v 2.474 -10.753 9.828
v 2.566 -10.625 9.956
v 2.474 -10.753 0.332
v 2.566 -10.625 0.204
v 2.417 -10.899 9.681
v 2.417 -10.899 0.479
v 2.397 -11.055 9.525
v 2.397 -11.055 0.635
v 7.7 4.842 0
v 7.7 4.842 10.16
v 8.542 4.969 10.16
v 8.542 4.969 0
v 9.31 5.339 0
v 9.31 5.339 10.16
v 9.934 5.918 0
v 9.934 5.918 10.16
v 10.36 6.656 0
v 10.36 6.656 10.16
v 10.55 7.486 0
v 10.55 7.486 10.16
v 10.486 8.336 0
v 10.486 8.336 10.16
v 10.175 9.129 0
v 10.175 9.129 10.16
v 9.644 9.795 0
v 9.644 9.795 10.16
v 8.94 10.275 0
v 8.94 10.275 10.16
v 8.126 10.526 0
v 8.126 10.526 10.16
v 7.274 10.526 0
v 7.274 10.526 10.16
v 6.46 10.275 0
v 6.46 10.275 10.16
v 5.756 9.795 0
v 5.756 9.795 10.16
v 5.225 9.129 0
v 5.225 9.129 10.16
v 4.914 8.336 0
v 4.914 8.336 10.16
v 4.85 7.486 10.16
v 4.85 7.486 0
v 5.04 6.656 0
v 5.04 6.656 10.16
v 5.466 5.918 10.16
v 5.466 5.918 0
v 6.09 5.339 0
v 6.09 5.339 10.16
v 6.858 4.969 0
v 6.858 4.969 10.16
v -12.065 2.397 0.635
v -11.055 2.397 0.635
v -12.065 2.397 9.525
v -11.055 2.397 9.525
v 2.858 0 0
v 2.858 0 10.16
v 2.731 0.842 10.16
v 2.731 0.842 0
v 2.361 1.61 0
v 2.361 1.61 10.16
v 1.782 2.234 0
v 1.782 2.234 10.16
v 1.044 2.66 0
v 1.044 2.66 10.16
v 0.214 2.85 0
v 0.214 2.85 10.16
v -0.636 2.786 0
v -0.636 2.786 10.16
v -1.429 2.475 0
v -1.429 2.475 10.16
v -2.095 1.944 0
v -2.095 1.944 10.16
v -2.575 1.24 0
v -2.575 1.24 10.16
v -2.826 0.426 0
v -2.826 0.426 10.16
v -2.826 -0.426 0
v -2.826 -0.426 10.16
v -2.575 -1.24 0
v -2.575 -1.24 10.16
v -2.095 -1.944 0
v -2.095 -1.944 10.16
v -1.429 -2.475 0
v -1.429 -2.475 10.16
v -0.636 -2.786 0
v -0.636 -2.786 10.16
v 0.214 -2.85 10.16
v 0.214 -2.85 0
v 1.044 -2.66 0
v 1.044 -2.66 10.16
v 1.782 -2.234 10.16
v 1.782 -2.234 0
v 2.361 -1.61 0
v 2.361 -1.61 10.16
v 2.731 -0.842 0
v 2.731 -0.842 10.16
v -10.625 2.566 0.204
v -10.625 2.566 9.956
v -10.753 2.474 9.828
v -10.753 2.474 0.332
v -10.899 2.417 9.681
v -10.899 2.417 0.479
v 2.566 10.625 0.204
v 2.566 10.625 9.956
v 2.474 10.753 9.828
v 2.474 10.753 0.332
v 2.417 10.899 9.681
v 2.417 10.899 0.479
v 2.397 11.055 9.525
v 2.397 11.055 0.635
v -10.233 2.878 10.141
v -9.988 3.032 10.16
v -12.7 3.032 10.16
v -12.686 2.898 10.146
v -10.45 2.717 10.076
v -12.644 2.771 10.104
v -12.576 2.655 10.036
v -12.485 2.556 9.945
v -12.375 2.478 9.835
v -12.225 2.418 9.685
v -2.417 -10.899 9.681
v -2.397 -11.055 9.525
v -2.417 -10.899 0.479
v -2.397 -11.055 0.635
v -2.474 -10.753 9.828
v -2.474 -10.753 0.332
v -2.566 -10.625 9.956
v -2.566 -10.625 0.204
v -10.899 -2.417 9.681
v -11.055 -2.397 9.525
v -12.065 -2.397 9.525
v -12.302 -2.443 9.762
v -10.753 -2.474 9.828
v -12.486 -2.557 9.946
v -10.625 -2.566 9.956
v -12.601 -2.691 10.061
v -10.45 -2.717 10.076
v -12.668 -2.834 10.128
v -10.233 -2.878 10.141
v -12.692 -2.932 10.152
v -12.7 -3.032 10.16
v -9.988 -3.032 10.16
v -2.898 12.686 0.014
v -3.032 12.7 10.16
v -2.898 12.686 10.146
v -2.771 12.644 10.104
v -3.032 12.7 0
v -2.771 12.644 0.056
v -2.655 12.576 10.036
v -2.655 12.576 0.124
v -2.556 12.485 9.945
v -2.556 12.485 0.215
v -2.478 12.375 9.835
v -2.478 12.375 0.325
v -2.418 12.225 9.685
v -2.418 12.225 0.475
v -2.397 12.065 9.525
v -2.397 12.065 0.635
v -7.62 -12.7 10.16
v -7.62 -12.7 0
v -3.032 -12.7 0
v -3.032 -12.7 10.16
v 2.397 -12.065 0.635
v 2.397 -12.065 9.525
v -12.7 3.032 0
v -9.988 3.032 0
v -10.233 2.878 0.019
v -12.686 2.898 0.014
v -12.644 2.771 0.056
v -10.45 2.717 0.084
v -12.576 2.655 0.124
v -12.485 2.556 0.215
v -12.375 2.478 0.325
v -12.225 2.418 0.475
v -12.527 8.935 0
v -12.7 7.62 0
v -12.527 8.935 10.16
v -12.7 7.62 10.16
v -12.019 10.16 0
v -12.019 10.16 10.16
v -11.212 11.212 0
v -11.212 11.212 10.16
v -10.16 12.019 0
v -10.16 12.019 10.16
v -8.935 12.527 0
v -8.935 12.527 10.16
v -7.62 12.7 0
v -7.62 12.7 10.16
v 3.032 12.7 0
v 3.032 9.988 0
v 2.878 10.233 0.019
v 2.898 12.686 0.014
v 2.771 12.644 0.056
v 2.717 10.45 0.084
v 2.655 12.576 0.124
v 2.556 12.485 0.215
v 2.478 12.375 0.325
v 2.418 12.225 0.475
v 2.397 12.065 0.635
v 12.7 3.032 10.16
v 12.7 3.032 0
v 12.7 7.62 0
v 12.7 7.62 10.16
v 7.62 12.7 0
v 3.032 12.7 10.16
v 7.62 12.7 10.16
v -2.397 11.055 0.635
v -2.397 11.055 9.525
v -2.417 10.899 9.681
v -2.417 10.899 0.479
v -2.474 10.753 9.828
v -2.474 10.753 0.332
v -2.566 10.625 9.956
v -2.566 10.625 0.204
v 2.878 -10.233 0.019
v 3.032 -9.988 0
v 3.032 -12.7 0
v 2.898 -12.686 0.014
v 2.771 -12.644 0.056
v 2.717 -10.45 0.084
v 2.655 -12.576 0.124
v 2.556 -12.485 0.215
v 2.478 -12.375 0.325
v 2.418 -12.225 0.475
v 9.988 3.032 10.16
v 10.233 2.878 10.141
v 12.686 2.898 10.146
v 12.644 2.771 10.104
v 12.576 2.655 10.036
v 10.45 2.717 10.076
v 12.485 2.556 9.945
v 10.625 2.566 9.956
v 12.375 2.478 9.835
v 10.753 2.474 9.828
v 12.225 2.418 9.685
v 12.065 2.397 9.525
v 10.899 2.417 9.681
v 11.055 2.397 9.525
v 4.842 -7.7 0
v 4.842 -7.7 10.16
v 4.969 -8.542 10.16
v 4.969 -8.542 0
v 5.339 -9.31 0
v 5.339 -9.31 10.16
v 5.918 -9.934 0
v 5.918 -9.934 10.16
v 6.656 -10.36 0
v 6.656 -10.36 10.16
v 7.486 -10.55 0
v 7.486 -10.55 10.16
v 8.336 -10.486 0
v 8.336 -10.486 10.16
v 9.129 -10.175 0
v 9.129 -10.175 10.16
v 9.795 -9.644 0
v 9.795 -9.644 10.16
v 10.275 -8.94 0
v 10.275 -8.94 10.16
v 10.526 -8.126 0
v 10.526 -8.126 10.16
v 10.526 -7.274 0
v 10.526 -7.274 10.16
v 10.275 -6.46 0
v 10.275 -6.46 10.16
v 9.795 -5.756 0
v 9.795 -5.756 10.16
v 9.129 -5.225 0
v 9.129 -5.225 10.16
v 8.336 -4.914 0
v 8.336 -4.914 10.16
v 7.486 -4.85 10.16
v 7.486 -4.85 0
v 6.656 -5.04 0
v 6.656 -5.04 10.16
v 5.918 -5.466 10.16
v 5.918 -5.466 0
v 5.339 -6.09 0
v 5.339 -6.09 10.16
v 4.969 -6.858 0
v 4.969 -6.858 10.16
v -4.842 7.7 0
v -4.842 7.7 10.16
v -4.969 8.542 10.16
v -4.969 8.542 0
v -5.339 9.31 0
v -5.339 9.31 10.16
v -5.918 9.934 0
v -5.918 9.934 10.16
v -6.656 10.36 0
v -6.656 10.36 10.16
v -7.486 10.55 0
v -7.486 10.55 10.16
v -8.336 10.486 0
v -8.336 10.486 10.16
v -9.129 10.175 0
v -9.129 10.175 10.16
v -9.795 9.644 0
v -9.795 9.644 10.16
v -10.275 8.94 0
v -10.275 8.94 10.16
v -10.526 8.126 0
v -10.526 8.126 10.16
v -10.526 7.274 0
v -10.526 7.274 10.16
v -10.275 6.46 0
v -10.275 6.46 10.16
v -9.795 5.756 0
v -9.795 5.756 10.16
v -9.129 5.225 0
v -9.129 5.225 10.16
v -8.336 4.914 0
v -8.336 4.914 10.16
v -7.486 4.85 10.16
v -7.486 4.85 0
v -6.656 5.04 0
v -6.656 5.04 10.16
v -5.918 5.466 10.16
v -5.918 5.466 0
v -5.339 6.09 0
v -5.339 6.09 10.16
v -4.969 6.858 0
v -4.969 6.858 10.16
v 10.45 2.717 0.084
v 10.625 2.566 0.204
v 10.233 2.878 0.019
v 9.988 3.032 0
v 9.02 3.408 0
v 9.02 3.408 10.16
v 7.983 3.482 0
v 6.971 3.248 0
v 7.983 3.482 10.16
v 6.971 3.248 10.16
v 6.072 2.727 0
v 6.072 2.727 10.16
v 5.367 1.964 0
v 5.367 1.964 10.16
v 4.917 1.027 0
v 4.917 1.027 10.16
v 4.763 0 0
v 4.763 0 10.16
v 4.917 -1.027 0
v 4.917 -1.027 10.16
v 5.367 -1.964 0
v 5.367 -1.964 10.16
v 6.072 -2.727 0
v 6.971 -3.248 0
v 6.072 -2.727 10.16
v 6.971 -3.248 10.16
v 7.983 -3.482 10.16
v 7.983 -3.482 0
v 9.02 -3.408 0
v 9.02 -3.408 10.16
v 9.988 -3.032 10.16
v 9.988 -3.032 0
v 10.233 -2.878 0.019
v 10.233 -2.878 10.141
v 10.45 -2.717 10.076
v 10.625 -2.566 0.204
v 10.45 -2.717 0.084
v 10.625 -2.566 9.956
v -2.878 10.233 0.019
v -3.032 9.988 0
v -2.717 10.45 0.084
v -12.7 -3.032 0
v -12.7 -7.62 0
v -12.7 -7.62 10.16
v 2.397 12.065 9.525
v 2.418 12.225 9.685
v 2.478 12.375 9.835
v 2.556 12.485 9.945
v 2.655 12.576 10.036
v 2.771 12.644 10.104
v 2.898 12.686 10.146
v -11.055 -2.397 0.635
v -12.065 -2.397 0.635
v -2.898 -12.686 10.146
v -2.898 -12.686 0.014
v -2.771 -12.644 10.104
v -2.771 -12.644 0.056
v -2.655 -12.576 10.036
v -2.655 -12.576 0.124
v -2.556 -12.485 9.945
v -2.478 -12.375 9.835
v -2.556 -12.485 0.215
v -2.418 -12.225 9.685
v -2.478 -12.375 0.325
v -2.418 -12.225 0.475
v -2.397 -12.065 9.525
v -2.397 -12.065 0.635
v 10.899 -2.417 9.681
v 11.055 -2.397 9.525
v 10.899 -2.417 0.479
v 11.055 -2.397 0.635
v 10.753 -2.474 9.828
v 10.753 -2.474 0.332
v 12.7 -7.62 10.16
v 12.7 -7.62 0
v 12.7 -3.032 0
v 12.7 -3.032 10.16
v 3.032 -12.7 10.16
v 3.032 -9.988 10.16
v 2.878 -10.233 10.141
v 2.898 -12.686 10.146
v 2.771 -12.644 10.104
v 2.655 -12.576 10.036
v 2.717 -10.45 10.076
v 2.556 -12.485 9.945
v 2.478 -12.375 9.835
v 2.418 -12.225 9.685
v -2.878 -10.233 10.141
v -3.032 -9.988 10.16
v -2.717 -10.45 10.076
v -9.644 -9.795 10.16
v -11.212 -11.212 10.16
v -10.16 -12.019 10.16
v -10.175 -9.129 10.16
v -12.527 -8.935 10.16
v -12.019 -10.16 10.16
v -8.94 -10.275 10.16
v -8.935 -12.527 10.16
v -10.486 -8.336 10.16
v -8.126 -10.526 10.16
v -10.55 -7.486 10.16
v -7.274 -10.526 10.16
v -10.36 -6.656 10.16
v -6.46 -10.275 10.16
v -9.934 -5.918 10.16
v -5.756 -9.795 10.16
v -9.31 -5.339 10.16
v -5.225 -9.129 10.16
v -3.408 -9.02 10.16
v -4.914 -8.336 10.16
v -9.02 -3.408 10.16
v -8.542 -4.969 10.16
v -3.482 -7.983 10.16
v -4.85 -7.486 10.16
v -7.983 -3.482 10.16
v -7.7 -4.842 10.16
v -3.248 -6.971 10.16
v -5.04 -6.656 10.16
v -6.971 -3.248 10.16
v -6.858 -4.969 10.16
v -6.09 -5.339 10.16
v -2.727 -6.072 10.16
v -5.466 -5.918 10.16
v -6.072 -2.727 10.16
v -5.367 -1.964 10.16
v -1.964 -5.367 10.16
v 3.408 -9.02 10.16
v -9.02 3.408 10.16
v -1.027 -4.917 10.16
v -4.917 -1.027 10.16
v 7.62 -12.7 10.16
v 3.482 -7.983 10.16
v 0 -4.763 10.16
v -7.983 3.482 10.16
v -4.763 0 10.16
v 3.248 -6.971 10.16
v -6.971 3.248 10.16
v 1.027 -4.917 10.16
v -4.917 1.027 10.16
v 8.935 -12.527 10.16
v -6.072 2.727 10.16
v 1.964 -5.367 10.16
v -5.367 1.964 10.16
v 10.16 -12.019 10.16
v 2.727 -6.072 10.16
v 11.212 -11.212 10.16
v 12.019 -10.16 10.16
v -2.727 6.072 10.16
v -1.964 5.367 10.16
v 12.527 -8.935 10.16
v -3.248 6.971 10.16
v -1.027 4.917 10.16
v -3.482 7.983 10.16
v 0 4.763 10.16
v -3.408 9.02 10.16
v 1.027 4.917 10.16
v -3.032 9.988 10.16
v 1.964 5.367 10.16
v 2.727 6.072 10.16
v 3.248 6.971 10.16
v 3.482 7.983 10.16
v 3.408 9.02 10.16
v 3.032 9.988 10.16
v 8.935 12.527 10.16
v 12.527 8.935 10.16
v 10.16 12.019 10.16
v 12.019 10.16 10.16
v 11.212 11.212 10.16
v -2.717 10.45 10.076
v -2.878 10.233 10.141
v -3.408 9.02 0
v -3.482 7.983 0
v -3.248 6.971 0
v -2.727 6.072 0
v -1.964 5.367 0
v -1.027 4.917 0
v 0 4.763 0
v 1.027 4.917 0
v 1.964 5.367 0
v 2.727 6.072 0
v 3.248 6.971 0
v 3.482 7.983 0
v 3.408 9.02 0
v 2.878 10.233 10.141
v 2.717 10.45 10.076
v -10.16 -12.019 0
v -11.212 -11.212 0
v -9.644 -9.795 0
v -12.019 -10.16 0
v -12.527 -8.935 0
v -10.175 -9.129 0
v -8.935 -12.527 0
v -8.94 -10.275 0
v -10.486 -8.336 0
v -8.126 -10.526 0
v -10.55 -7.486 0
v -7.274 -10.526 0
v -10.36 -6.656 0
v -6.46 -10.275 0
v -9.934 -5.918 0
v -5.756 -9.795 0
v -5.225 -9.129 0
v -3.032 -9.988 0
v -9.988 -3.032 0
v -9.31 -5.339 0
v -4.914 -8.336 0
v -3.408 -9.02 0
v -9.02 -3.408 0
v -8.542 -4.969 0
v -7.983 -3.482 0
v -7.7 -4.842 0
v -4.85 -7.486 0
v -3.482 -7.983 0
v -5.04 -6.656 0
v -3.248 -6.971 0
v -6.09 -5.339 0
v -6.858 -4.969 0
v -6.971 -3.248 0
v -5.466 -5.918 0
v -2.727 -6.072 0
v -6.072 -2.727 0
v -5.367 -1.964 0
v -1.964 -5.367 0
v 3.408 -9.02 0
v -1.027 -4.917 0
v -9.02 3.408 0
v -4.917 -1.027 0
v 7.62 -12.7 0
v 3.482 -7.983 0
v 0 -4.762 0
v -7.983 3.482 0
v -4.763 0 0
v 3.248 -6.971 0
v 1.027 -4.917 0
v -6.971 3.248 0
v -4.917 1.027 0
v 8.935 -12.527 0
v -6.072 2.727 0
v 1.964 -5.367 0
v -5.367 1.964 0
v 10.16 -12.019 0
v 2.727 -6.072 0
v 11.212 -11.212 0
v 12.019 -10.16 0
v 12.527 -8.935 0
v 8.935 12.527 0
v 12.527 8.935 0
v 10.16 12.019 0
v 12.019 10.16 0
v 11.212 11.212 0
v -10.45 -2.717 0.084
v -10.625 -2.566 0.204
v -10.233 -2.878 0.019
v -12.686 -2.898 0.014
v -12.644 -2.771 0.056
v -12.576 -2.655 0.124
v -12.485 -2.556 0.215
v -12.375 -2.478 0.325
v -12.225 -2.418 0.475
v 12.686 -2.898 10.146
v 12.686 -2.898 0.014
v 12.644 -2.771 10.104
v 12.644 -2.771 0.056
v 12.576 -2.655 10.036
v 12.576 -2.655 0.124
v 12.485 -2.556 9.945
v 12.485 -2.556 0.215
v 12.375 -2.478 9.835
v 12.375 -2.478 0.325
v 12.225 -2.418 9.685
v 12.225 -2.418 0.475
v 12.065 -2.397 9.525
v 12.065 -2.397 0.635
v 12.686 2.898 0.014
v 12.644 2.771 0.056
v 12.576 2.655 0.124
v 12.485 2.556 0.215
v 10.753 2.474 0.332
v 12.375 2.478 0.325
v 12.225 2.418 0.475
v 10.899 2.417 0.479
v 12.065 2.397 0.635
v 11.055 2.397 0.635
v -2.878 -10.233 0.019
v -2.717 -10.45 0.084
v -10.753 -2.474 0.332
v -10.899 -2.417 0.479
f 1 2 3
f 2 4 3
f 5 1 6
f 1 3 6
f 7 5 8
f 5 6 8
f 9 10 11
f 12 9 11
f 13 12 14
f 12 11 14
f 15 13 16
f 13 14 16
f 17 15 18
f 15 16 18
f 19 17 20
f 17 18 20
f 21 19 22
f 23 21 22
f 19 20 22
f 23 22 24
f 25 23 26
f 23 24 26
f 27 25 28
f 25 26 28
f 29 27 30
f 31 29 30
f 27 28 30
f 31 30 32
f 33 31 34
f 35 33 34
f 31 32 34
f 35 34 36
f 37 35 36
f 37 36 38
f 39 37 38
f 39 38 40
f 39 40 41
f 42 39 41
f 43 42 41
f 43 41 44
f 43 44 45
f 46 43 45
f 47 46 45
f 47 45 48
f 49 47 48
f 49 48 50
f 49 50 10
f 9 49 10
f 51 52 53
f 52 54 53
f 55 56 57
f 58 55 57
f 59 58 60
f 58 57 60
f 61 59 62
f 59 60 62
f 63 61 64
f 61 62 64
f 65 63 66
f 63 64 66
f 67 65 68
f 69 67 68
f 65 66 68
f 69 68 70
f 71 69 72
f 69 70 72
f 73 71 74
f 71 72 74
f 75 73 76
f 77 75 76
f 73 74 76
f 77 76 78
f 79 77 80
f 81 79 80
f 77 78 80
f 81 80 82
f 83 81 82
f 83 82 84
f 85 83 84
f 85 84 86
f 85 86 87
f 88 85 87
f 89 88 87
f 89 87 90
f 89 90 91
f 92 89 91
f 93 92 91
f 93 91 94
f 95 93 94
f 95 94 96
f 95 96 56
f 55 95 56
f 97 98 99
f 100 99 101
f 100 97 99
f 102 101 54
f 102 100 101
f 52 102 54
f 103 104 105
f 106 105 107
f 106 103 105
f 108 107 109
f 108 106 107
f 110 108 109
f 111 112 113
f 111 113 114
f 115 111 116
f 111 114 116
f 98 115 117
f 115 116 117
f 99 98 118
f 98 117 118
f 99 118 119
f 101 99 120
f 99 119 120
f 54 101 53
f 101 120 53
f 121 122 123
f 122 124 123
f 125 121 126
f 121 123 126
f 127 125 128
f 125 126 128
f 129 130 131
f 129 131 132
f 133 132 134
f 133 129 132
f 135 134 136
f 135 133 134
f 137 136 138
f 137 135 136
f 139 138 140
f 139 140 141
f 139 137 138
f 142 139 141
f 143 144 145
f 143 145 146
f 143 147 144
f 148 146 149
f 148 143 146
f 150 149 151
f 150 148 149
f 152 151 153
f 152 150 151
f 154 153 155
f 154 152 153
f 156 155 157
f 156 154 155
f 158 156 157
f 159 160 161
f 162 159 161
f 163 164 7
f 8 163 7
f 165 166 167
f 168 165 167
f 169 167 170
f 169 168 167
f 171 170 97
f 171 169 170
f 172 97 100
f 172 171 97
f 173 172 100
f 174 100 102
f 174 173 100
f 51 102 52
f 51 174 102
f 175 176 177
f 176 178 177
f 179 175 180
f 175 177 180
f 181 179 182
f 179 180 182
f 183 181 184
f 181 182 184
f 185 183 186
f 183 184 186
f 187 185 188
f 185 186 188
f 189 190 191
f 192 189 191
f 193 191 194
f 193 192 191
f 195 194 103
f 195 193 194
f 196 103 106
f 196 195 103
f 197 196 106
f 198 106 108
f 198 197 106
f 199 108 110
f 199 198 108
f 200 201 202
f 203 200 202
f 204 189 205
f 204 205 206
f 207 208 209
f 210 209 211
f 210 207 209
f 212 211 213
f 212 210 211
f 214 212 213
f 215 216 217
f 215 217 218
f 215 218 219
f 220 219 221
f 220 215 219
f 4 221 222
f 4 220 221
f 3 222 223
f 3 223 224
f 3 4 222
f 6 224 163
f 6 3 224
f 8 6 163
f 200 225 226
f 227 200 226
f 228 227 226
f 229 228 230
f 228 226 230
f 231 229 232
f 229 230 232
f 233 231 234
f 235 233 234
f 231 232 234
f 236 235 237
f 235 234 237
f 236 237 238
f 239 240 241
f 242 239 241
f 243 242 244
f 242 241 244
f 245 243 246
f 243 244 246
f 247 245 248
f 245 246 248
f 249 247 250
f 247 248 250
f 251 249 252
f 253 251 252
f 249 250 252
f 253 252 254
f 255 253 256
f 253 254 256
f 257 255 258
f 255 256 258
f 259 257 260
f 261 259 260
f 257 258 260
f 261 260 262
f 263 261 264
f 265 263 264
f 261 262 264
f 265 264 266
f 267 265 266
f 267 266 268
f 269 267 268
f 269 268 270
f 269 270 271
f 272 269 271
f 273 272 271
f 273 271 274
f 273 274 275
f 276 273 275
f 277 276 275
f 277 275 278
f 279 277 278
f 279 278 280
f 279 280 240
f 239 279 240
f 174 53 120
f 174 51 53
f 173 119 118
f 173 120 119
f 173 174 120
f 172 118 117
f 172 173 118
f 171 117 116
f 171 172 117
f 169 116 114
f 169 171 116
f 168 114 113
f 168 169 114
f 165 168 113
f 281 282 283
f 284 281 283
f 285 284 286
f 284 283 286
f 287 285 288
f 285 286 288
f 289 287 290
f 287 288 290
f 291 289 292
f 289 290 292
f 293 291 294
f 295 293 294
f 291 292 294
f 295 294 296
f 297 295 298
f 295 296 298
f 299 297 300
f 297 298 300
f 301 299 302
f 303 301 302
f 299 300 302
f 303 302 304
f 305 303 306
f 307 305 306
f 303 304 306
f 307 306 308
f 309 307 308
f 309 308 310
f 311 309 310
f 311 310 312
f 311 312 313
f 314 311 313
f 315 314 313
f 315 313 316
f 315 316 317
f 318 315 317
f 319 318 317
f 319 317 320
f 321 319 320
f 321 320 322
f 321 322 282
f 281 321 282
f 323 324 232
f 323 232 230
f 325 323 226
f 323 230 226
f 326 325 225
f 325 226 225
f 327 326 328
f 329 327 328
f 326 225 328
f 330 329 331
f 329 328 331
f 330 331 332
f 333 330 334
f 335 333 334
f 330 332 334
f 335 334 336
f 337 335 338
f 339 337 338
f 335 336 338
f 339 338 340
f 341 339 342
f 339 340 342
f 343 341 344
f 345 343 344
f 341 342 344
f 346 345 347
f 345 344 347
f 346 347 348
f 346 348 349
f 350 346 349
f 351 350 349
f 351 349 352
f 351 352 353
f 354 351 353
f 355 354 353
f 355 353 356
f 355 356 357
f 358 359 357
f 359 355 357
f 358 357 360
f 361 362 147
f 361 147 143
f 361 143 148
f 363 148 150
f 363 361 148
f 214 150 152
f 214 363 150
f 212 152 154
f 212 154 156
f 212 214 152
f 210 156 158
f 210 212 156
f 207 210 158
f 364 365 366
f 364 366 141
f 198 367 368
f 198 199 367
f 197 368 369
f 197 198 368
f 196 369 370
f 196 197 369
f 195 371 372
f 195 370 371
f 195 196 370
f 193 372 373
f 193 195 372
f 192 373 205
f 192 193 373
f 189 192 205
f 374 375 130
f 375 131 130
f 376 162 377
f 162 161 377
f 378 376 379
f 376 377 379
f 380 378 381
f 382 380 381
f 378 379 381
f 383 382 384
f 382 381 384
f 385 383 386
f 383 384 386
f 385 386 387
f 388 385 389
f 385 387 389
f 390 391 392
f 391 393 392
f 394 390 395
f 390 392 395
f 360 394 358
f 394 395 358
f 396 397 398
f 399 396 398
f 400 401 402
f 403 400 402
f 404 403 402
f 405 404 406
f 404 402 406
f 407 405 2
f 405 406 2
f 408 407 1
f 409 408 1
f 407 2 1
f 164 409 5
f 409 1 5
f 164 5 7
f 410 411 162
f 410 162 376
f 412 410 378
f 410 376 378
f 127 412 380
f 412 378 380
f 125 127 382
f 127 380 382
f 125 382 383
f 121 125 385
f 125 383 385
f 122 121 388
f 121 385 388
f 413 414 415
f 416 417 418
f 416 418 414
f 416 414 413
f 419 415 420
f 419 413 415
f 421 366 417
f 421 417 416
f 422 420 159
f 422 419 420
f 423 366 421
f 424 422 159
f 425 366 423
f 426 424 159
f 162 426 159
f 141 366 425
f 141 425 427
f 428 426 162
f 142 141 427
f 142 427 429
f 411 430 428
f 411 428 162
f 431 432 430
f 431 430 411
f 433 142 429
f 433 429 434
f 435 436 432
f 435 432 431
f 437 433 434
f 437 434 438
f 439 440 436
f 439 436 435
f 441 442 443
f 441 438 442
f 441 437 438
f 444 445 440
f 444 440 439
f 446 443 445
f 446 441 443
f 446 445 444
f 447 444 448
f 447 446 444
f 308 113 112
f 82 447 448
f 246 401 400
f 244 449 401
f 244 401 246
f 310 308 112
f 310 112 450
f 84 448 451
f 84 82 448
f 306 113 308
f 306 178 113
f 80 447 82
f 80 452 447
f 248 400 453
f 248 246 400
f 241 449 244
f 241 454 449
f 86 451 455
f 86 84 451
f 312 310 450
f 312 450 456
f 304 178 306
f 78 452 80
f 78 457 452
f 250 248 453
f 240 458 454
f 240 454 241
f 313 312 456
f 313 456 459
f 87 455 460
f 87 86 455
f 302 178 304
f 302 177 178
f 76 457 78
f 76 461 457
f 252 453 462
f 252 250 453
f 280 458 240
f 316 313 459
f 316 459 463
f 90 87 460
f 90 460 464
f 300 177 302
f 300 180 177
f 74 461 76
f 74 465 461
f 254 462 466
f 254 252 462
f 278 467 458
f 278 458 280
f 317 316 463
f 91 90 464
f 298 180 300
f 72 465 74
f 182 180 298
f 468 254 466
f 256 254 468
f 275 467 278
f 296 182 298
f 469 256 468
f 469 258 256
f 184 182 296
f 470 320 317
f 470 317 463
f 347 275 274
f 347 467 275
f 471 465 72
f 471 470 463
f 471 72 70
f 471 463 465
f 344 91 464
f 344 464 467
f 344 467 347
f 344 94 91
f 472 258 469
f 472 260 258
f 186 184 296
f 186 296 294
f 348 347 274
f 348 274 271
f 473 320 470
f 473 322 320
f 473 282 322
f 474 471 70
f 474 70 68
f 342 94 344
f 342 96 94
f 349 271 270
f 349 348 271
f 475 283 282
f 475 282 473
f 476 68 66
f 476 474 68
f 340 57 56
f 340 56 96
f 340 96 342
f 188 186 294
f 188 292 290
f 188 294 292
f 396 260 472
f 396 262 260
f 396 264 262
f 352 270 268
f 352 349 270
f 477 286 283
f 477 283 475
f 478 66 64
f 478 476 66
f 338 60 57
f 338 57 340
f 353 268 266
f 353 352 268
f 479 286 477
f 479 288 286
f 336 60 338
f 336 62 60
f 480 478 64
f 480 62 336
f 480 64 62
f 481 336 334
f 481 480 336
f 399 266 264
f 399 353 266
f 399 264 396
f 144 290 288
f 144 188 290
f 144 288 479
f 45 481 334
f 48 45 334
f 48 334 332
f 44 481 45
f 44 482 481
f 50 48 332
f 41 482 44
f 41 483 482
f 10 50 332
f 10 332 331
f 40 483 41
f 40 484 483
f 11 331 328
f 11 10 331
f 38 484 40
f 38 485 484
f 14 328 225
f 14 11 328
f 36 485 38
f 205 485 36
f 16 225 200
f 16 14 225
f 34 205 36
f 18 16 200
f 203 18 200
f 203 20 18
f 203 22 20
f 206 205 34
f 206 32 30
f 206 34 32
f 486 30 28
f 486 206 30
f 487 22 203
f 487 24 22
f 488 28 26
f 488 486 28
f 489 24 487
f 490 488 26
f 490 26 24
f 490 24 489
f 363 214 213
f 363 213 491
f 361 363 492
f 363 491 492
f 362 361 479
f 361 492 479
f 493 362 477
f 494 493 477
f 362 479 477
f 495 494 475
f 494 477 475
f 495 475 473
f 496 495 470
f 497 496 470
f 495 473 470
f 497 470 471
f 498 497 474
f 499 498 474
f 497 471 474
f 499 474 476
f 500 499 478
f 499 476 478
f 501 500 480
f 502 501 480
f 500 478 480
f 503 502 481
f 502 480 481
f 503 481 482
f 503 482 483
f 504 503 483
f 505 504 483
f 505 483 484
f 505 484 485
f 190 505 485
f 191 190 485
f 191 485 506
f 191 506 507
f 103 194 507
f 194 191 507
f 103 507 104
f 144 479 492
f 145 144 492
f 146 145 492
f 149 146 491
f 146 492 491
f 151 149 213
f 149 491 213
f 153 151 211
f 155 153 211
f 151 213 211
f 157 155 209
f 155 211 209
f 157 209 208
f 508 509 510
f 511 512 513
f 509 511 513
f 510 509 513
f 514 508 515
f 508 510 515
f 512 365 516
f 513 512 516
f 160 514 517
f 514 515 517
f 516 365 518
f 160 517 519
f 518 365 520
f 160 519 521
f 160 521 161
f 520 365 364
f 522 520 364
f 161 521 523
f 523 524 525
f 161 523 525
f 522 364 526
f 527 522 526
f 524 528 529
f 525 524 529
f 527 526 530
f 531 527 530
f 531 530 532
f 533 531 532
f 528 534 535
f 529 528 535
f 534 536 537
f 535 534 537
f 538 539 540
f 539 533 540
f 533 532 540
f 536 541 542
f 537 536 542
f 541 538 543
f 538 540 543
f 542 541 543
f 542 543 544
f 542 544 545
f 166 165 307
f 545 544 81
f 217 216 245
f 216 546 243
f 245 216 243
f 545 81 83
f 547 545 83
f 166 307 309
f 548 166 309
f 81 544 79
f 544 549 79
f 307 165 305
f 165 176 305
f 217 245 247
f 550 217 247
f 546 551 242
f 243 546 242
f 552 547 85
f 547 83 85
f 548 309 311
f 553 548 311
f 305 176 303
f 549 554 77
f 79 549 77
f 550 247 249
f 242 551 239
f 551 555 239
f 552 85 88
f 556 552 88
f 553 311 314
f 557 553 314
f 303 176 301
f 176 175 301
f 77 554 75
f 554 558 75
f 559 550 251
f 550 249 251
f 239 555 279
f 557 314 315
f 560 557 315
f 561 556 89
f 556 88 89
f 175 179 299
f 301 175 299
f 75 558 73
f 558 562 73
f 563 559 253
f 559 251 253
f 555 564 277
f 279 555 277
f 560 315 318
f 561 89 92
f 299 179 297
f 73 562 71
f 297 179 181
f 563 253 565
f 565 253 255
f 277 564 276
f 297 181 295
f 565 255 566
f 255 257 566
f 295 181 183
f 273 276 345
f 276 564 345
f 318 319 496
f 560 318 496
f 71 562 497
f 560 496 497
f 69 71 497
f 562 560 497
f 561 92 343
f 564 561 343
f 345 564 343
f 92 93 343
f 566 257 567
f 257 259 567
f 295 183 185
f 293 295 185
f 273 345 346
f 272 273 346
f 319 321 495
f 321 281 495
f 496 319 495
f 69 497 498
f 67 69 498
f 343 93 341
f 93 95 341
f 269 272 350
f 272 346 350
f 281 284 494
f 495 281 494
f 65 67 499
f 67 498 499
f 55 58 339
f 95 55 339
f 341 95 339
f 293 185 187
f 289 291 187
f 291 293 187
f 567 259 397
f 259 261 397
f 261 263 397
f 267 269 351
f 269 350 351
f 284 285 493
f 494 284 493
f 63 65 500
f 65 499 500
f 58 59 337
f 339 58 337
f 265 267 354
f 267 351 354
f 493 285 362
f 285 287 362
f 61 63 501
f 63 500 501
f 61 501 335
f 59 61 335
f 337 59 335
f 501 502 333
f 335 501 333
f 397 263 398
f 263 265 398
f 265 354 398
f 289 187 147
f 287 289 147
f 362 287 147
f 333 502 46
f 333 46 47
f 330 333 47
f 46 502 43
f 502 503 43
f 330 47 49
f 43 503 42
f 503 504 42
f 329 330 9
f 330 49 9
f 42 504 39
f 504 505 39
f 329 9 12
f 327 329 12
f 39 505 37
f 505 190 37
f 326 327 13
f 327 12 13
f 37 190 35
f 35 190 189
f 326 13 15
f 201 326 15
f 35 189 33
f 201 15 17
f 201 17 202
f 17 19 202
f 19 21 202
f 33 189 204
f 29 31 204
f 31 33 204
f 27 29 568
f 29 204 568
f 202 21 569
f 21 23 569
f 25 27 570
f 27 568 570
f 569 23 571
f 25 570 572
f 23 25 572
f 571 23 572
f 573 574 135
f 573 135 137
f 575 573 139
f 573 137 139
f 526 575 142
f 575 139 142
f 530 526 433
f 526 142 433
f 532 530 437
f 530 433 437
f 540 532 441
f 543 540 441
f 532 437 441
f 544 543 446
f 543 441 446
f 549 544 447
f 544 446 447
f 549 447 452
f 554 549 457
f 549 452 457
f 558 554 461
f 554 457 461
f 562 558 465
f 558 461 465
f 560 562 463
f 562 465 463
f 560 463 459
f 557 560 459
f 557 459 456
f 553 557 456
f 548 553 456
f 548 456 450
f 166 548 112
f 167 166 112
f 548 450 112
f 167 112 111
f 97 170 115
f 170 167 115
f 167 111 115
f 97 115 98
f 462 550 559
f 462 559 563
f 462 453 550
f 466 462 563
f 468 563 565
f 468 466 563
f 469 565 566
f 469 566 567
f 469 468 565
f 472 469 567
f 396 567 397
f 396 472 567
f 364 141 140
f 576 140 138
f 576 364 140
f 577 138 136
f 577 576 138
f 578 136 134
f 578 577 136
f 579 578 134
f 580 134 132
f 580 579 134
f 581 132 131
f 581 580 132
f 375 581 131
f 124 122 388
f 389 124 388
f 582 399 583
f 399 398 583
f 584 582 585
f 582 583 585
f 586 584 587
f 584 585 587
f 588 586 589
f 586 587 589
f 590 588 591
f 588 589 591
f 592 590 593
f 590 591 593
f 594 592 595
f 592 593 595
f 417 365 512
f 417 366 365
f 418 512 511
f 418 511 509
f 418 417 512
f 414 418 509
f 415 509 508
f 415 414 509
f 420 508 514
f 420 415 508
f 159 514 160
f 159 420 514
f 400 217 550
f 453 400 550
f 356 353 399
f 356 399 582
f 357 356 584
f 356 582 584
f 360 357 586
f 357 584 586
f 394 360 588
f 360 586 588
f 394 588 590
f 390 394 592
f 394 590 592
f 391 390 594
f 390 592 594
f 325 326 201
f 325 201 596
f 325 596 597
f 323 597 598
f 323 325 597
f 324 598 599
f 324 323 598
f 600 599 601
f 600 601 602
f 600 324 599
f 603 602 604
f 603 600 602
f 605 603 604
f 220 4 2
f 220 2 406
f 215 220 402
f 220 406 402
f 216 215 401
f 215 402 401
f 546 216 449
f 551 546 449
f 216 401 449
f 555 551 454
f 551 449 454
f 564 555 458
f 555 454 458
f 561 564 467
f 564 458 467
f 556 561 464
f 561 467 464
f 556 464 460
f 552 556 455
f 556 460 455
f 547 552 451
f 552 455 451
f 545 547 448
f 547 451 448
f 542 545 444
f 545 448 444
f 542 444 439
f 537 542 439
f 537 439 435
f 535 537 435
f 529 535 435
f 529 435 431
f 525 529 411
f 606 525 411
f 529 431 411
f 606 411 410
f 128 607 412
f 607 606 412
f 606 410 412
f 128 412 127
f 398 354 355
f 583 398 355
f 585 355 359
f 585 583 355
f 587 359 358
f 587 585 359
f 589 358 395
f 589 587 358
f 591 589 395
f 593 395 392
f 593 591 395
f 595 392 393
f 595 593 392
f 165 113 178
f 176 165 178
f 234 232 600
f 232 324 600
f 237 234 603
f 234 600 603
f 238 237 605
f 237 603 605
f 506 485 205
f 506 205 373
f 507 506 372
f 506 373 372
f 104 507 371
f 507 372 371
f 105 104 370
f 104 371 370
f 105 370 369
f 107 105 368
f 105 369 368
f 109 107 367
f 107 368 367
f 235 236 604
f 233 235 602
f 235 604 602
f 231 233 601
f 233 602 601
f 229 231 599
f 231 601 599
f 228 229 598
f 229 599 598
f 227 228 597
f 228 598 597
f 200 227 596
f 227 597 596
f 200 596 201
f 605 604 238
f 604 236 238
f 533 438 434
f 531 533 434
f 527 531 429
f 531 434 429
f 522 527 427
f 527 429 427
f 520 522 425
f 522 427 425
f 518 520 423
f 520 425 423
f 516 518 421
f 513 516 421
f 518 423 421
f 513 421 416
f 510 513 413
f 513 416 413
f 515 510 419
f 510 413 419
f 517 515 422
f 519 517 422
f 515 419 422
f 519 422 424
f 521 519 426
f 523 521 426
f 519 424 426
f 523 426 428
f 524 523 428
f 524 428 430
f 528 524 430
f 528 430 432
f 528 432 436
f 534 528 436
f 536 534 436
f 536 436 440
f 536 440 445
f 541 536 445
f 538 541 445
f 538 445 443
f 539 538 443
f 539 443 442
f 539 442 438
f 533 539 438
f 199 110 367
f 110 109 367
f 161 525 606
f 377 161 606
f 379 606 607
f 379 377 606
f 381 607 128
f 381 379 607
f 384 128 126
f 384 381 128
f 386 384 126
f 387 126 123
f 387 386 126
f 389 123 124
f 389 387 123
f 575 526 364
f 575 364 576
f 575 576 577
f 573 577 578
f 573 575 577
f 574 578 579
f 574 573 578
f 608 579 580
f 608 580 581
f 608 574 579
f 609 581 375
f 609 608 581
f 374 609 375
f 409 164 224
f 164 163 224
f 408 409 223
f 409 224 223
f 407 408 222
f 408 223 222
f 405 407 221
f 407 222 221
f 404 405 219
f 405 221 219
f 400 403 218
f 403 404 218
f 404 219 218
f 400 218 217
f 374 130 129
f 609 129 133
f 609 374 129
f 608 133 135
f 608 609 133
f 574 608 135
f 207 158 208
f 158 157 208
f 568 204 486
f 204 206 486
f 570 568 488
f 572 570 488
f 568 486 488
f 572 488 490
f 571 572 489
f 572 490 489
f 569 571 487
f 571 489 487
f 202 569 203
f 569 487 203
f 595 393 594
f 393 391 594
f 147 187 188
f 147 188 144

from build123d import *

# Parameters (mm, degrees)
F0_W             = 25.4
F0_H             = 25.4
F1_DEPTH         = 10.16
F2_R             = 3.4925
F3_DEPTH         = 25.4
F3_COPIES_COUNT  = 4
F5_DEPTH         = 25.4
F5_COPIES_COUNT  = 4
F7_R             = 2.8575
F8_DEPTH         = 25.4
F9_R             = 2.8575
F10_DEPTH        = 25.4
F10_COPIES_COUNT = 4
F11_R            = 5.08
F12_R            = 0.635


# Not quite as in the source:
# - a pattern or mirror of a feature is missing from the dataset's text; its kind, count and spacing are read off the source's solid


with BuildPart() as f1:
    # F0 (on Top) → F1 (new body)
    with BuildSketch(Plane.XY):
        Rectangle(F0_W, F0_H)
    extrude(amount=F1_DEPTH)

    # F2 (on face) → F3 (cut)
    with BuildSketch(Plane.XY.offset(10.16)):
        with Locations((0, -8.255)):
            Circle(F2_R)
    f3 = extrude(amount=-F3_DEPTH, mode=Mode.SUBTRACT)

    # F3_copies: F3 ×4 about axis
    f3_copies_axis = Axis((0, 0, 0), (0, 0, 1))
    for i in range(1, F3_COPIES_COUNT):
        add(f3.rotate(f3_copies_axis, i * 360 / F3_COPIES_COUNT), mode=Mode.SUBTRACT)

    # F4 (on face) → F5 (cut)
    with BuildSketch(Plane.XY.offset(10.16)):
        with BuildLine():
            Line((-2.3970724332, -10.795), (-2.3970724332, -12.7))
            Line((-2.3970724332, -12.7), (2.3970724332, -12.7))
            Line((2.3970724332, -12.7), (2.3970724332, -10.795))
            ThreePointArc((2.3970724332, -10.795), (0, -11.7475), (-2.3970724332, -10.795))
        make_face()
    f5 = extrude(amount=-F5_DEPTH, mode=Mode.SUBTRACT)

    # F5_copies: F5 ×4 about axis
    f5_copies_axis = Axis((0, 0, 0), (0, 0, 1))
    for i in range(1, F5_COPIES_COUNT):
        add(f5.rotate(f5_copies_axis, i * 360 / F5_COPIES_COUNT), mode=Mode.SUBTRACT)

    # F7 (on face) → F8 (cut)
    with BuildSketch(Plane.XY.offset(10.16)):
        Circle(F7_R)
    extrude(amount=-F8_DEPTH, mode=Mode.SUBTRACT)

    # F9 (on face) → F10 (cut)
    with BuildSketch(Plane.XY.offset(10.16)):
        with Locations((-7.7, 7.7)):
            Circle(F9_R)
    f10 = extrude(amount=-F10_DEPTH, mode=Mode.SUBTRACT)

    # F10_copies: F10 ×4 about axis
    f10_copies_axis = Axis((0, 0, 0), (0, 0, 1))
    for i in range(1, F10_COPIES_COUNT):
        add(f10.rotate(f10_copies_axis, i * 360 / F10_COPIES_COUNT), mode=Mode.SUBTRACT)

    # F11
    f11_edges = [f1.edges().sort_by_distance(p)[0] for p in [
        (-12.7, 12.7, 5.08),
        (-12.7, -12.7, 5.08),
        (12.7, -12.7, 5.08),
        (12.7, 12.7, 5.08),
    ]]
    fillet(f11_edges, radius=F11_R)

    # F12
    f12_edges = [f1.edges().sort_by_distance(p)[0] for p in [
        (2.397072, -11.7475, 10.16),
        (2.397072, -10.795, 5.08),
        (2.397072, -11.7475, 0),
        (2.397072, -12.7, 5.08),
        (-2.397072, -11.7475, 10.16),
        (-2.397072, -12.7, 5.08),
        (-2.397072, -11.7475, 0),
        (-2.397072, -10.795, 5.08),
        (11.7475, 2.397072, 0),
        (2.397072, 11.7475, 0),
        (11.7475, -2.397072, 0),
        (-2.397072, 11.7475, 0),
        (-11.7475, 2.397072, 0),
        (-11.7475, -2.397072, 0),
        (11.7475, 2.397072, 10.16),
        (2.397072, 11.7475, 10.16),
        (11.7475, -2.397072, 10.16),
        (-2.397072, 11.7475, 10.16),
        (-11.7475, 2.397072, 10.16),
        (-11.7475, -2.397072, 10.16),
        (12.7, 2.397072, 5.08),
        (10.795, 2.397072, 5.08),
        (2.397072, 12.7, 5.08),
        (10.795, -2.397072, 5.08),
        (2.397072, 10.795, 5.08),
        (12.7, -2.397072, 5.08),
        (-2.397072, 10.795, 5.08),
        (-2.397072, 12.7, 5.08),
        (-12.7, 2.397072, 5.08),
        (-10.795, 2.397072, 5.08),
        (-10.795, -2.397072, 5.08),
        (-12.7, -2.397072, 5.08),
    ]]
    fillet(f12_edges, radius=F12_R)


solid = f1.part
